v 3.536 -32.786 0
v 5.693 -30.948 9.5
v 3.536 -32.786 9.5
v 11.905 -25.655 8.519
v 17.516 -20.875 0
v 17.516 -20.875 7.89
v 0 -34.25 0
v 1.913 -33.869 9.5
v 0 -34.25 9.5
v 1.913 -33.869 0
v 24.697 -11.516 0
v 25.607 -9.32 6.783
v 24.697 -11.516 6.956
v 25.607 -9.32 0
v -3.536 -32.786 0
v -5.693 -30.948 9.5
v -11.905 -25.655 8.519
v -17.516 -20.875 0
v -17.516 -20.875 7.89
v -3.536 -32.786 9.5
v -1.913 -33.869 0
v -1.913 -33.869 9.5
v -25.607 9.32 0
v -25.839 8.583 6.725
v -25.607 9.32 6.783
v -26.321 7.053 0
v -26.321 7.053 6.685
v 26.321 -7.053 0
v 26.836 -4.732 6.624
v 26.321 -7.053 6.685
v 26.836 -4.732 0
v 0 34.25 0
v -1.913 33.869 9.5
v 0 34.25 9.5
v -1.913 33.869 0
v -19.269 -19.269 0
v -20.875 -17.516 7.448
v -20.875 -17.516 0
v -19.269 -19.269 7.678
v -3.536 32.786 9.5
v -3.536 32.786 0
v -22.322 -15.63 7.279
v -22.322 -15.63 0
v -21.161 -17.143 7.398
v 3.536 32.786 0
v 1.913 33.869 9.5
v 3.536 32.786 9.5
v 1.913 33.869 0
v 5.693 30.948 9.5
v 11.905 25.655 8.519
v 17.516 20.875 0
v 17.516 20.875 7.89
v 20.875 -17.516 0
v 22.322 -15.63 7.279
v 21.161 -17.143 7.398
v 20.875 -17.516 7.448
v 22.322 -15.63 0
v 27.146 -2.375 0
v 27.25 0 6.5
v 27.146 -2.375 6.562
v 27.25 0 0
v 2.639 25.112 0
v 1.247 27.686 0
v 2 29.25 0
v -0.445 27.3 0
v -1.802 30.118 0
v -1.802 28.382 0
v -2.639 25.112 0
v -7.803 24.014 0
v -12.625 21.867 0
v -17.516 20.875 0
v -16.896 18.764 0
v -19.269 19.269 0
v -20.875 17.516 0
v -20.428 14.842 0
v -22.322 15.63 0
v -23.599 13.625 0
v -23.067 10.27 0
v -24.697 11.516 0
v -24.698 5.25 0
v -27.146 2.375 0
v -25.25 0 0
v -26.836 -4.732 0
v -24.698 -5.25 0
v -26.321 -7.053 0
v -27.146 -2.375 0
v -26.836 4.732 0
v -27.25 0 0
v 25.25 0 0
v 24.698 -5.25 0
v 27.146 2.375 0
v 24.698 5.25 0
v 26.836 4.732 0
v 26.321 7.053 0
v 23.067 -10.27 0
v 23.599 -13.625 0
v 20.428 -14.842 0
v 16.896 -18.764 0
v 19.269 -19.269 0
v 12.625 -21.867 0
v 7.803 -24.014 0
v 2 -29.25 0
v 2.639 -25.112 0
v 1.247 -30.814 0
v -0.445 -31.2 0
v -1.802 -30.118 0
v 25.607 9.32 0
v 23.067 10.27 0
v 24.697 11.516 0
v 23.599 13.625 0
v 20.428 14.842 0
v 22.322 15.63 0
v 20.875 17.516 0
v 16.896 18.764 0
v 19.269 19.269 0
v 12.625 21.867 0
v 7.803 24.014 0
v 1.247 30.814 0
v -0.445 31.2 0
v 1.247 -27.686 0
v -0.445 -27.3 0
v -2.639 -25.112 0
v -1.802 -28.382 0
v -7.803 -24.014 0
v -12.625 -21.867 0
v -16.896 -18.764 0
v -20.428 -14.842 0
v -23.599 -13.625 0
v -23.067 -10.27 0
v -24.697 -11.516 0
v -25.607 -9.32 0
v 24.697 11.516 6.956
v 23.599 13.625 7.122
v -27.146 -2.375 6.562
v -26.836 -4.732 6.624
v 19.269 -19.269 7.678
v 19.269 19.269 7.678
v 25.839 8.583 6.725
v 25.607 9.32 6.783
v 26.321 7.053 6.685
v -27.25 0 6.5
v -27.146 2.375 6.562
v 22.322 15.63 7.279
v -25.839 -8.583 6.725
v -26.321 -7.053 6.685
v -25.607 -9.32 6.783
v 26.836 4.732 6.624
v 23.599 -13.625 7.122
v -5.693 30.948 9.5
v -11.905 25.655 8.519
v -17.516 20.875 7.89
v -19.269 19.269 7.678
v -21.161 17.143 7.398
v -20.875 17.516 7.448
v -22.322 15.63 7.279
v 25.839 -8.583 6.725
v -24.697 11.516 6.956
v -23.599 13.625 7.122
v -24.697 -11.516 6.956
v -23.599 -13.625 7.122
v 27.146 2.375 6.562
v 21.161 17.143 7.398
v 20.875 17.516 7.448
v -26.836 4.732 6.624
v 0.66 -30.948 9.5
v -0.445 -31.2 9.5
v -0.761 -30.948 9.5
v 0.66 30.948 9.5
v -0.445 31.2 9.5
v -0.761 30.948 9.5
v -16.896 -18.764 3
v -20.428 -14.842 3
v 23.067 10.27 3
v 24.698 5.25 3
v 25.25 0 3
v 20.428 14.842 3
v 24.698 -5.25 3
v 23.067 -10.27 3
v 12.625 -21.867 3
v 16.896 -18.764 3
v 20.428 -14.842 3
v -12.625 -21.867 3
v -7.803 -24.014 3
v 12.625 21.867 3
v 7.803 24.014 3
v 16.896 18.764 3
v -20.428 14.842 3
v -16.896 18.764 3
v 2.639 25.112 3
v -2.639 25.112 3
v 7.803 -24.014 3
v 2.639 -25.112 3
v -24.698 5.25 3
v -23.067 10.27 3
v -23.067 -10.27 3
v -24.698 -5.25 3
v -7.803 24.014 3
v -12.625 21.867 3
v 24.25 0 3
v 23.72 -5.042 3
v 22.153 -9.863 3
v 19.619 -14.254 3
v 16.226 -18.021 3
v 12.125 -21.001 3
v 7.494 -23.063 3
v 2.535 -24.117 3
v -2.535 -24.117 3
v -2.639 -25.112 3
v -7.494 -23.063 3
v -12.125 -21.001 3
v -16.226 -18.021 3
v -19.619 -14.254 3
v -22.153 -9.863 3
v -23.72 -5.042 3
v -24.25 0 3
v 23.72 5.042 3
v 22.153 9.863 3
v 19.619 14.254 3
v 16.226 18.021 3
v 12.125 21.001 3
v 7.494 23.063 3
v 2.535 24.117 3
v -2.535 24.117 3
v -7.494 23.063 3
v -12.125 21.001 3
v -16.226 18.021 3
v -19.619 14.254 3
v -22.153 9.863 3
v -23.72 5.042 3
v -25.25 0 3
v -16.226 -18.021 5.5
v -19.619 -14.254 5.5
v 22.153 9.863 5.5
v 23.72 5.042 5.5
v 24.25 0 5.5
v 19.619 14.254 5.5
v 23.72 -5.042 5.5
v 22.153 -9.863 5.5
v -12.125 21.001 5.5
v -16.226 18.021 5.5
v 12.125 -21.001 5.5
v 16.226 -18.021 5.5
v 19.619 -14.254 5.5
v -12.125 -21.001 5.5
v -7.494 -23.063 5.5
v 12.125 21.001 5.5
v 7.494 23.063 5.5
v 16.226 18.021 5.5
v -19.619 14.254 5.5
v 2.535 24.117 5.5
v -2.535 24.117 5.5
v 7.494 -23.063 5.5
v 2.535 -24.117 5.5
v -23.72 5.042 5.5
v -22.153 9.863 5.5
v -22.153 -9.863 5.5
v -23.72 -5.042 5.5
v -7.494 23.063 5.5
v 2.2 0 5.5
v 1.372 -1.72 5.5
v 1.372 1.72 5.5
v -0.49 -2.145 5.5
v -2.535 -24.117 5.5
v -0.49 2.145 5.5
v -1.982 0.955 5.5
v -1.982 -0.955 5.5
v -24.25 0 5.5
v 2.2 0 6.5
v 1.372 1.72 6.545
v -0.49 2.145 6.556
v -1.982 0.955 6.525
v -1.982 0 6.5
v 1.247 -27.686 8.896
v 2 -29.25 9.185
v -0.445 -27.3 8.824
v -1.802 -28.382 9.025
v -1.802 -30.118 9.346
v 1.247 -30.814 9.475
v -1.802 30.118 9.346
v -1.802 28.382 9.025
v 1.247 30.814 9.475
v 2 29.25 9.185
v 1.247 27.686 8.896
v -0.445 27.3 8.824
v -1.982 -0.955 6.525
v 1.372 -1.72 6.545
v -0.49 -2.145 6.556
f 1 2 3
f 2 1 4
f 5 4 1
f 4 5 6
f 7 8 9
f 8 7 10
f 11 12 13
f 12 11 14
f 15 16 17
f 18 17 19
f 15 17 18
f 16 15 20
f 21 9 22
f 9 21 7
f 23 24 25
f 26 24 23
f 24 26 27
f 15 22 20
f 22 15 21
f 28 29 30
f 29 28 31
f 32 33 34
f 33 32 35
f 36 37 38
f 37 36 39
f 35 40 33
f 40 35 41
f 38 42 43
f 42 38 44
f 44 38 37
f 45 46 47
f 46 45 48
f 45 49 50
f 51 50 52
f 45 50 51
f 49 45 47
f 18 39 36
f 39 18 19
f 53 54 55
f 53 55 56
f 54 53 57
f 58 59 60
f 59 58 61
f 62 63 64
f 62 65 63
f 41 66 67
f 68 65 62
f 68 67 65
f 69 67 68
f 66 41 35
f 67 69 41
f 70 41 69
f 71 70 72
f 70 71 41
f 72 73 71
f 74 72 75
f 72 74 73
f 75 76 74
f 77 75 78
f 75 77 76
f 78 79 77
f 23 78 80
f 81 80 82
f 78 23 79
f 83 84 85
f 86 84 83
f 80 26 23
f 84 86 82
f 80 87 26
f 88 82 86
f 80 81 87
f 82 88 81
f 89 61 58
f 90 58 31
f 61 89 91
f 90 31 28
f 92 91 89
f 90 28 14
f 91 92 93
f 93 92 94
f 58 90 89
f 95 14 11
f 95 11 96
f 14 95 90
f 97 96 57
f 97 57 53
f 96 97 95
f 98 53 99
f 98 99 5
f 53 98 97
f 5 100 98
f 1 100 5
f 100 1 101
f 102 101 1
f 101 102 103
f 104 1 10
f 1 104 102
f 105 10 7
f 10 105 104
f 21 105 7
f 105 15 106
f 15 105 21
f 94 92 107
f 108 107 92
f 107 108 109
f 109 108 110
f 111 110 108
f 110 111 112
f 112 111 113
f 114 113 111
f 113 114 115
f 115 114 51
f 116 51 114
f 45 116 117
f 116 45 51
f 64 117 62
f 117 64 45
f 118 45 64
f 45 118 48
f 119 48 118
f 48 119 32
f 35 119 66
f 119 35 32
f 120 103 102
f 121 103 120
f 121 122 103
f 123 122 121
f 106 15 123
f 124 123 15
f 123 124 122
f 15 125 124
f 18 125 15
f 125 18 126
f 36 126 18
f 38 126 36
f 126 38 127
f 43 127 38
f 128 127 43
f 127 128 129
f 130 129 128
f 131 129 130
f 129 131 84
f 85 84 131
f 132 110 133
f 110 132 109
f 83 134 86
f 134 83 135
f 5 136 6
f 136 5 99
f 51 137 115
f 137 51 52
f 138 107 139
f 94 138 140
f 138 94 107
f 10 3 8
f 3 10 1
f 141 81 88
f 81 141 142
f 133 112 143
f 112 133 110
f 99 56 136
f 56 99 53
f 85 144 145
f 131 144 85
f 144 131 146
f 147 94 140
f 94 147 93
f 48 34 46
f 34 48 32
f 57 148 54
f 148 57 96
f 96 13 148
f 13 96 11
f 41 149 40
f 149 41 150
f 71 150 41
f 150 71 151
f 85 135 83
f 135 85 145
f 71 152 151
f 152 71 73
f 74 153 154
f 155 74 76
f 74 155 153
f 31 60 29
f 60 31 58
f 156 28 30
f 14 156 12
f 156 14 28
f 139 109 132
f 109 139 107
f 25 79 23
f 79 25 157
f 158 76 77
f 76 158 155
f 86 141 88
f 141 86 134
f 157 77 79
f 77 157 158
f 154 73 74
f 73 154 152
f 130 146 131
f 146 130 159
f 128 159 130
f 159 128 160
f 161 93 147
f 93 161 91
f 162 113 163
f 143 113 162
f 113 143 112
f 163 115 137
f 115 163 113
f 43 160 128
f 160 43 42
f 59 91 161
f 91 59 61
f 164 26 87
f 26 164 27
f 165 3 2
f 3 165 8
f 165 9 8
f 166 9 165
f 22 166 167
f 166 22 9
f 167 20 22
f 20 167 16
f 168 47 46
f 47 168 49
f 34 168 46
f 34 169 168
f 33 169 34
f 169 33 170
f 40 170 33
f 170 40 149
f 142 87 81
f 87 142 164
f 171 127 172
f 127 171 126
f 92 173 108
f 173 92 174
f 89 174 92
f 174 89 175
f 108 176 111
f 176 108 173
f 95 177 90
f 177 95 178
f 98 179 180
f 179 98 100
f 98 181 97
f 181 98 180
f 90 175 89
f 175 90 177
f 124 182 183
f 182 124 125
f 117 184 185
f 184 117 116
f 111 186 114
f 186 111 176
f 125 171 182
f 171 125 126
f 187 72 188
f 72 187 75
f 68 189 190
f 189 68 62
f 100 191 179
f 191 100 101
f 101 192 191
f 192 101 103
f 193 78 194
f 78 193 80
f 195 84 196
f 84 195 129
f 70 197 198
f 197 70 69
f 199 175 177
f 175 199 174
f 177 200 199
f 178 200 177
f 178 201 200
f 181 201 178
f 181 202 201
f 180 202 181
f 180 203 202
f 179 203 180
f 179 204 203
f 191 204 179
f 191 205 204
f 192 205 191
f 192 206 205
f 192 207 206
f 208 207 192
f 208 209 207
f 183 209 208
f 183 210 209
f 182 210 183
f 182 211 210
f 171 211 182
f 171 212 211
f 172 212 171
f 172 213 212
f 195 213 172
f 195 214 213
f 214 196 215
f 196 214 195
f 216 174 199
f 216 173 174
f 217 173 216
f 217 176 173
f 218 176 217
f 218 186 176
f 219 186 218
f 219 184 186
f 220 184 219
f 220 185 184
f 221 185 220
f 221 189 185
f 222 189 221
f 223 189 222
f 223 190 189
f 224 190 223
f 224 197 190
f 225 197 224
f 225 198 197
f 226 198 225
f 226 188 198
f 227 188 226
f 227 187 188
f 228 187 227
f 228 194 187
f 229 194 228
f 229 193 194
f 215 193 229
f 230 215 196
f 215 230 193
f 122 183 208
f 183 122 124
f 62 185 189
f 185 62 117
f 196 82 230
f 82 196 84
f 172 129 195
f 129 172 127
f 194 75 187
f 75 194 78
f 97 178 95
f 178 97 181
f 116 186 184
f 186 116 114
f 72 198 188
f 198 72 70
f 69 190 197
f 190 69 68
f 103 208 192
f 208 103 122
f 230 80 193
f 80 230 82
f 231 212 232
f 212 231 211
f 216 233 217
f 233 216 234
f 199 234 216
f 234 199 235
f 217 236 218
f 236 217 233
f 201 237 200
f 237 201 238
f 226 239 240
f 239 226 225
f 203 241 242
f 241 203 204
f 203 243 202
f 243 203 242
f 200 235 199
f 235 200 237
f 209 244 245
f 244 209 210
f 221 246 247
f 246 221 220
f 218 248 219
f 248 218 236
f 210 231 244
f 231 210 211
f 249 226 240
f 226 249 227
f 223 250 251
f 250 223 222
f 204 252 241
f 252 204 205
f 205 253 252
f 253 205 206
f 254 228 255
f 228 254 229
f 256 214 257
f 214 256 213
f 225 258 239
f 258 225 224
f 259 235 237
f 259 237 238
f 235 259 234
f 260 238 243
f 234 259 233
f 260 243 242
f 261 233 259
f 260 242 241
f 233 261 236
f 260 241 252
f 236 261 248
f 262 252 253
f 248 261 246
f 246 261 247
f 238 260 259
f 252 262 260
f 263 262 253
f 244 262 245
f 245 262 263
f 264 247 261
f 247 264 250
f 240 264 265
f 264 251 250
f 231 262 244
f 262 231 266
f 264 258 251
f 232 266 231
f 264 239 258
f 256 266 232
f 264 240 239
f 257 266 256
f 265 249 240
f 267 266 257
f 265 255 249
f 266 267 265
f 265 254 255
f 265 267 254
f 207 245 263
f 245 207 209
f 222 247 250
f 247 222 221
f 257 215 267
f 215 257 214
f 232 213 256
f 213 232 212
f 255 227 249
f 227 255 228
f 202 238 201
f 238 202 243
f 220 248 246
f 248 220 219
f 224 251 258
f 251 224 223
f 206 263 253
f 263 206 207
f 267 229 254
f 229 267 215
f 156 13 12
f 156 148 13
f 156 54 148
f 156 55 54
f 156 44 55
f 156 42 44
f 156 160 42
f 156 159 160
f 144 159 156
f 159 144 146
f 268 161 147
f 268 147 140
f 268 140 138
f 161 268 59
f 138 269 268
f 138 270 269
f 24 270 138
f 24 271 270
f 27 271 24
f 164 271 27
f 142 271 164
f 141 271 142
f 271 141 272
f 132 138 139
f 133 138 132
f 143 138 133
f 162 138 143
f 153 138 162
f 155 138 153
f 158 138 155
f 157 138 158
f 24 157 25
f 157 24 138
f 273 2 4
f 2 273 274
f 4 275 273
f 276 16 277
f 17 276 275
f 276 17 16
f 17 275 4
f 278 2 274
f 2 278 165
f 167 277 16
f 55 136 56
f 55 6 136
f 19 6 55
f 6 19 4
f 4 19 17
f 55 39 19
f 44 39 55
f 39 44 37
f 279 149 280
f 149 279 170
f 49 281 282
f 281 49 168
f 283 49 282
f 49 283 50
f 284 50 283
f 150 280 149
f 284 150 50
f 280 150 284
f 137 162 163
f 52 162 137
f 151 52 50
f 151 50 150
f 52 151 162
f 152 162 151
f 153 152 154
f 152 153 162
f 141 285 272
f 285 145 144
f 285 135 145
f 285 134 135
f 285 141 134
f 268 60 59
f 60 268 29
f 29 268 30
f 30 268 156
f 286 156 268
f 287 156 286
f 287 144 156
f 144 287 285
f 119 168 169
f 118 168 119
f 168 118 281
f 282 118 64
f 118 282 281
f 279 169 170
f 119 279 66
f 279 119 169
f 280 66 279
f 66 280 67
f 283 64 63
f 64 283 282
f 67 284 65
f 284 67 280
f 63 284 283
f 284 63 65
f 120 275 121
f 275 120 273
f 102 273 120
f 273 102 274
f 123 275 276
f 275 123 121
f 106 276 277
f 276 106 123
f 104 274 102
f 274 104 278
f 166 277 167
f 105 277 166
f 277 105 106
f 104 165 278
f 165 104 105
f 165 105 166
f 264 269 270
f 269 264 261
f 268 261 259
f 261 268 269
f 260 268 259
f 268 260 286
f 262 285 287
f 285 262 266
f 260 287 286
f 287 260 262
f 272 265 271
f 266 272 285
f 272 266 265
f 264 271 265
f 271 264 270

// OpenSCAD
piezo_diameter = 50.5;
rim_thickness = 2;
cavity_height = 2.5;
rim_height = 3;
cutout_diameter = 328;

module outside() {
  base_height = 4;
  h = cavity_height + rim_height + base_height;

  difference() {
    hull() {
      cylinder(h, r = piezo_diameter / 2 + rim_thickness, $fa  = 5);

      translate([0, piezo_diameter / 2 + rim_thickness + 2, 0])
      cylinder(h, r = 5);

      translate([0, -(piezo_diameter / 2 + rim_thickness + 2), 0])
      cylinder(h, r = 5);
    }
      
    translate([0, 0, -1])
    cylinder(rim_height + 1, r = piezo_diameter / 2);
      
    translate([0, 0, -1])
    cylinder(rim_height + cavity_height + 1, r = piezo_diameter / 2 - 1);
      
    
    translate([-500, 0, cutout_diameter / 2 + cavity_height + rim_height + 1])
    rotate([0, 90, 0])
    cylinder(1000, r = cutout_diameter / 2, $fa  = 3);

    translate([0, piezo_diameter / 2 + rim_thickness + 2, -1])
    cylinder(h + 2, r = 2);

    translate([0, -(piezo_diameter / 2 + rim_thickness + 2), -1])
    cylinder(h + 2, r = 2);

    translate([0, 0, -50])
    cylinder(100, r = 2.2);
  }
}

module inside() {
  cavity_height = cavity_height + 1;
  base_height = 2;
  h = cavity_height + rim_height + base_height;

  intersection() {
    difference() {
      hull() {
        cylinder(h, r = piezo_diameter / 2 + rim_thickness, $fa  = 5);

        translate([0, piezo_diameter / 2 + rim_thickness + 2, 0])
        cylinder(h, r = 5);

        translate([0, -(piezo_diameter / 2 + rim_thickness + 2), 0])
        cylinder(h, r = 5);
      }
        
      translate([0, 0, -1])
      cylinder(rim_height + 1 + 1.5, r = piezo_diameter / 2, $fa = 5);
        
      translate([0, 0, -1])
      cylinder(rim_height + cavity_height + 1, r = piezo_diameter / 2 - 1);


      translate([0, piezo_diameter / 2 + rim_thickness + 2, -1])
      cylinder(h + 2, r = 1.5);

      translate([0, -(piezo_diameter / 2 + rim_thickness + 2), -1])
      cylinder(h + 2, r = 1.5);

      translate([0, 0, base_height + cavity_height - 102.5])
      cube([100, 2, 100]);

      rotate([0, 86, 0])
      translate([-cutout_diameter / 2 - 5.5, 0, -500])
      cylinder(1000, r = (cutout_diameter - 6) / 2, $fa  = 3);

    }

    translate([-500, 0, (cutout_diameter - 6) / 2])
    rotate([0, 90, 0])
    cylinder(1000, r = (cutout_diameter - 6) / 2, $fa  = 3);
  }
}






outside();

//inside();
